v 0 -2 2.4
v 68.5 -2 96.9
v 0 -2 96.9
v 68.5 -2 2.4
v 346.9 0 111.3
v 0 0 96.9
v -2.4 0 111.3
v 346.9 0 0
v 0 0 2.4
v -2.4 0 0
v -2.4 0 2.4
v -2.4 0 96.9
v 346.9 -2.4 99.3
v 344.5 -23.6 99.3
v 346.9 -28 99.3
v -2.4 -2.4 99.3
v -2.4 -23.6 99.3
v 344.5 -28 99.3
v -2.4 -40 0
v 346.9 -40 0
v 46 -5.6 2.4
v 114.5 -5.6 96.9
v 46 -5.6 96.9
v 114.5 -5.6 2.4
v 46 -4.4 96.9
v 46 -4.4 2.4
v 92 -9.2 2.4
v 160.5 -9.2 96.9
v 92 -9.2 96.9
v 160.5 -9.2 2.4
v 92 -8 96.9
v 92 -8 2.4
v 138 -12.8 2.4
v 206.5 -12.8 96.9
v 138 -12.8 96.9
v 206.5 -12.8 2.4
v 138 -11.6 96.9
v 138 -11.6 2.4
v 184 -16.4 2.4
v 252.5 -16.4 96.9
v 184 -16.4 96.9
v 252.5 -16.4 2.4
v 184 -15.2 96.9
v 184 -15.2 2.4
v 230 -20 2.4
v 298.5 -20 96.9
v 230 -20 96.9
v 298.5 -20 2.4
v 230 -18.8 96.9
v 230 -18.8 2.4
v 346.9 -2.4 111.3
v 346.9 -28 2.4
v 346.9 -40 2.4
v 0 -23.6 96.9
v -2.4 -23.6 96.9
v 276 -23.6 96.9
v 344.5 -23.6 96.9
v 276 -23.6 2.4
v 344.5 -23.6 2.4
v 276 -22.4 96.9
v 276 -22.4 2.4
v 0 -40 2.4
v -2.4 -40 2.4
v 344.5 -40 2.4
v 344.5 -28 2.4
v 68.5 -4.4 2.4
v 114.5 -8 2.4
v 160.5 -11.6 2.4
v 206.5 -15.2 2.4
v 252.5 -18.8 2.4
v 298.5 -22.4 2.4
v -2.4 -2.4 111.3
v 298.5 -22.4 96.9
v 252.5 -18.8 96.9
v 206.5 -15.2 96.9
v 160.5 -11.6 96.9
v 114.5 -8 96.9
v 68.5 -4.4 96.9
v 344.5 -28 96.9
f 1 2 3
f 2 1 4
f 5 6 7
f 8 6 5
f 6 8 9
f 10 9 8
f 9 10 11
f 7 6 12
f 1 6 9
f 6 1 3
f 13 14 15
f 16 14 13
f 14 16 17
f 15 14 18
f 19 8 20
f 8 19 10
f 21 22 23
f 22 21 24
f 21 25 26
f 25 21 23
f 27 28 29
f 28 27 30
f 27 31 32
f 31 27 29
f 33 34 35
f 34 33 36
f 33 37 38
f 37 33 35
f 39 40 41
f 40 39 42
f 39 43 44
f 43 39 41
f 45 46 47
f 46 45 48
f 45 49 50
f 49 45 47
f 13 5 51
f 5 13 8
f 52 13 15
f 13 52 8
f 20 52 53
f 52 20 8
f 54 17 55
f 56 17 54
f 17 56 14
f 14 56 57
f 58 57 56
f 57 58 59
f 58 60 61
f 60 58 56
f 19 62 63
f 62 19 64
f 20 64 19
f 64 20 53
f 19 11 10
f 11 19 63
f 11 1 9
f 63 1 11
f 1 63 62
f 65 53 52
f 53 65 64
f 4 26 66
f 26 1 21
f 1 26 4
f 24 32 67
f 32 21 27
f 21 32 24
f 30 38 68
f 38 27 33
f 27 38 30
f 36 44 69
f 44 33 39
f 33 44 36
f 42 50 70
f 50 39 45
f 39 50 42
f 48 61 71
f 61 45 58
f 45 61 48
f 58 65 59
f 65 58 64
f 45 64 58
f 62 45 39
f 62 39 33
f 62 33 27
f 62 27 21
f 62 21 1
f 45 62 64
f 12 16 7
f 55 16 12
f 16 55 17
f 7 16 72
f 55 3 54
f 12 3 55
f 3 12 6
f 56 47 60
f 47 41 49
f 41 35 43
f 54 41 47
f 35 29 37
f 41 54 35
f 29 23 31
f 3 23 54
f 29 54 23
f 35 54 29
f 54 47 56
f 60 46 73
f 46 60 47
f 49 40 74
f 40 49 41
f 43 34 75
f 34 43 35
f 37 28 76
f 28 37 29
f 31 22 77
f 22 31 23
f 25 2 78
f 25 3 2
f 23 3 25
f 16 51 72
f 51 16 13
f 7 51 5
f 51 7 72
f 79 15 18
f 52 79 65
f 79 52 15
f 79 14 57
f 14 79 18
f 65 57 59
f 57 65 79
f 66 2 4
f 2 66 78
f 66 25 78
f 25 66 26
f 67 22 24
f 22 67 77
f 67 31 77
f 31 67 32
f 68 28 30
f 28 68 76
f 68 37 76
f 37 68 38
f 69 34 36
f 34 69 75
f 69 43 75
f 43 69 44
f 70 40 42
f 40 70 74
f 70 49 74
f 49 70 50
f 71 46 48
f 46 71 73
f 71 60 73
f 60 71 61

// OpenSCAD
// Hand rack: holds the AI's hand on the bed's back edge, in front of the AI, like a player holding their cards.
// Seven slots in a staircase. Each card lies flat on its own shelf, one pitch right of and one rise above the card
// before it, so its left strip (with the steel washer under its centre) stays open to the magnet and the camera,
// while its right part slides under the next card's shelf. A card leaves sideways: the magnet grips it, slides it
// one pitch left over the lower card, then lifts (gantry.py rack_slot). The fence along the front, the person's side,
// hides the faces; it replaces the separate privacy wall. Feet take the double-sided mounting tape. Units: mm.
//
// Print it standing on the fence (print = true, the default): the slots become vertical slits and need no supports.

print     = true;
slots     = 7;        // a full hand; an eighth card waits in the battlefield's spare spot until the AI discards
card_w    = 66.5;     // double-sleeved card, measure yours
card_l    = 92.5;
card_t    = 1.6;      // one sleeved card with its washer: measure 10 and divide (same number as deck_box.scad)
gap       = 0.8;      // slot height = card_t + gap
shelf_t   = 1.2;
pitch     = 46;       // the open strip of each card: must uncover the card's centre plus the magnet's radius (10)
clear     = 1.0;      // around a card in its slot
wall      = 2.4;      // front and back rails
base_t    = 2.0;
fence_h   = 40;       // above the bed: hides the faces from the person's seat; set gantry.json travel_z above it
foot      = 12;       // tape foot behind the back rail
rise      = card_t + gap + shelf_t;
assert(pitch >= card_w / 2 + 10 + 2, "pitch must uncover the card's centre and the magnet's radius");

sw = card_w + 2 * clear;                   // a slot's width
sl = card_l + 2 * clear;                   // a slot's depth
D  = sl + 2 * wall;
L  = (slots - 1) * pitch + sw + wall;      // the last slot gets an end wall on its right
function top(k) = base_t + k * rise;       // the shelf a card in slot k lies on

module rack() {
    difference() {
        union() {
            for (k = [0 : slots - 1])         // a step: solid from the bed up to slot k's shelf
                translate([k * pitch, 0, 0]) cube([(k == slots - 1 ? sw + wall : sw), D, top(k)]);
            translate([-wall, 0, 0]) cube([L + wall, wall, fence_h]);             // the fence (person's side)
            translate([-wall, D - wall, 0]) cube([L + wall, wall, top(slots - 1)]); // the back rail
            translate([-wall, D, 0]) cube([L + wall, foot, wall]);                  // tape foot
            translate([(slots - 1) * pitch + sw, 0, 0]) cube([wall, D, top(slots - 1) + card_t + gap + 2]);  // end stop
        }
        for (k = [0 : slots - 1])            // slot k: open above its left strip, under the next shelf on the right
            translate([k * pitch, wall, top(k)]) cube([sw, sl, card_t + gap]);
        for (k = [0 : slots - 1])            // and open to the sky over its left strip
            translate([k * pitch, wall, top(k)]) cube([(k == slots - 1 ? sw : pitch), sl, 200]);
    }
}

if (print) rotate([90, 0, 0]) rack();     // fence on the bed; front face down
else rack();
